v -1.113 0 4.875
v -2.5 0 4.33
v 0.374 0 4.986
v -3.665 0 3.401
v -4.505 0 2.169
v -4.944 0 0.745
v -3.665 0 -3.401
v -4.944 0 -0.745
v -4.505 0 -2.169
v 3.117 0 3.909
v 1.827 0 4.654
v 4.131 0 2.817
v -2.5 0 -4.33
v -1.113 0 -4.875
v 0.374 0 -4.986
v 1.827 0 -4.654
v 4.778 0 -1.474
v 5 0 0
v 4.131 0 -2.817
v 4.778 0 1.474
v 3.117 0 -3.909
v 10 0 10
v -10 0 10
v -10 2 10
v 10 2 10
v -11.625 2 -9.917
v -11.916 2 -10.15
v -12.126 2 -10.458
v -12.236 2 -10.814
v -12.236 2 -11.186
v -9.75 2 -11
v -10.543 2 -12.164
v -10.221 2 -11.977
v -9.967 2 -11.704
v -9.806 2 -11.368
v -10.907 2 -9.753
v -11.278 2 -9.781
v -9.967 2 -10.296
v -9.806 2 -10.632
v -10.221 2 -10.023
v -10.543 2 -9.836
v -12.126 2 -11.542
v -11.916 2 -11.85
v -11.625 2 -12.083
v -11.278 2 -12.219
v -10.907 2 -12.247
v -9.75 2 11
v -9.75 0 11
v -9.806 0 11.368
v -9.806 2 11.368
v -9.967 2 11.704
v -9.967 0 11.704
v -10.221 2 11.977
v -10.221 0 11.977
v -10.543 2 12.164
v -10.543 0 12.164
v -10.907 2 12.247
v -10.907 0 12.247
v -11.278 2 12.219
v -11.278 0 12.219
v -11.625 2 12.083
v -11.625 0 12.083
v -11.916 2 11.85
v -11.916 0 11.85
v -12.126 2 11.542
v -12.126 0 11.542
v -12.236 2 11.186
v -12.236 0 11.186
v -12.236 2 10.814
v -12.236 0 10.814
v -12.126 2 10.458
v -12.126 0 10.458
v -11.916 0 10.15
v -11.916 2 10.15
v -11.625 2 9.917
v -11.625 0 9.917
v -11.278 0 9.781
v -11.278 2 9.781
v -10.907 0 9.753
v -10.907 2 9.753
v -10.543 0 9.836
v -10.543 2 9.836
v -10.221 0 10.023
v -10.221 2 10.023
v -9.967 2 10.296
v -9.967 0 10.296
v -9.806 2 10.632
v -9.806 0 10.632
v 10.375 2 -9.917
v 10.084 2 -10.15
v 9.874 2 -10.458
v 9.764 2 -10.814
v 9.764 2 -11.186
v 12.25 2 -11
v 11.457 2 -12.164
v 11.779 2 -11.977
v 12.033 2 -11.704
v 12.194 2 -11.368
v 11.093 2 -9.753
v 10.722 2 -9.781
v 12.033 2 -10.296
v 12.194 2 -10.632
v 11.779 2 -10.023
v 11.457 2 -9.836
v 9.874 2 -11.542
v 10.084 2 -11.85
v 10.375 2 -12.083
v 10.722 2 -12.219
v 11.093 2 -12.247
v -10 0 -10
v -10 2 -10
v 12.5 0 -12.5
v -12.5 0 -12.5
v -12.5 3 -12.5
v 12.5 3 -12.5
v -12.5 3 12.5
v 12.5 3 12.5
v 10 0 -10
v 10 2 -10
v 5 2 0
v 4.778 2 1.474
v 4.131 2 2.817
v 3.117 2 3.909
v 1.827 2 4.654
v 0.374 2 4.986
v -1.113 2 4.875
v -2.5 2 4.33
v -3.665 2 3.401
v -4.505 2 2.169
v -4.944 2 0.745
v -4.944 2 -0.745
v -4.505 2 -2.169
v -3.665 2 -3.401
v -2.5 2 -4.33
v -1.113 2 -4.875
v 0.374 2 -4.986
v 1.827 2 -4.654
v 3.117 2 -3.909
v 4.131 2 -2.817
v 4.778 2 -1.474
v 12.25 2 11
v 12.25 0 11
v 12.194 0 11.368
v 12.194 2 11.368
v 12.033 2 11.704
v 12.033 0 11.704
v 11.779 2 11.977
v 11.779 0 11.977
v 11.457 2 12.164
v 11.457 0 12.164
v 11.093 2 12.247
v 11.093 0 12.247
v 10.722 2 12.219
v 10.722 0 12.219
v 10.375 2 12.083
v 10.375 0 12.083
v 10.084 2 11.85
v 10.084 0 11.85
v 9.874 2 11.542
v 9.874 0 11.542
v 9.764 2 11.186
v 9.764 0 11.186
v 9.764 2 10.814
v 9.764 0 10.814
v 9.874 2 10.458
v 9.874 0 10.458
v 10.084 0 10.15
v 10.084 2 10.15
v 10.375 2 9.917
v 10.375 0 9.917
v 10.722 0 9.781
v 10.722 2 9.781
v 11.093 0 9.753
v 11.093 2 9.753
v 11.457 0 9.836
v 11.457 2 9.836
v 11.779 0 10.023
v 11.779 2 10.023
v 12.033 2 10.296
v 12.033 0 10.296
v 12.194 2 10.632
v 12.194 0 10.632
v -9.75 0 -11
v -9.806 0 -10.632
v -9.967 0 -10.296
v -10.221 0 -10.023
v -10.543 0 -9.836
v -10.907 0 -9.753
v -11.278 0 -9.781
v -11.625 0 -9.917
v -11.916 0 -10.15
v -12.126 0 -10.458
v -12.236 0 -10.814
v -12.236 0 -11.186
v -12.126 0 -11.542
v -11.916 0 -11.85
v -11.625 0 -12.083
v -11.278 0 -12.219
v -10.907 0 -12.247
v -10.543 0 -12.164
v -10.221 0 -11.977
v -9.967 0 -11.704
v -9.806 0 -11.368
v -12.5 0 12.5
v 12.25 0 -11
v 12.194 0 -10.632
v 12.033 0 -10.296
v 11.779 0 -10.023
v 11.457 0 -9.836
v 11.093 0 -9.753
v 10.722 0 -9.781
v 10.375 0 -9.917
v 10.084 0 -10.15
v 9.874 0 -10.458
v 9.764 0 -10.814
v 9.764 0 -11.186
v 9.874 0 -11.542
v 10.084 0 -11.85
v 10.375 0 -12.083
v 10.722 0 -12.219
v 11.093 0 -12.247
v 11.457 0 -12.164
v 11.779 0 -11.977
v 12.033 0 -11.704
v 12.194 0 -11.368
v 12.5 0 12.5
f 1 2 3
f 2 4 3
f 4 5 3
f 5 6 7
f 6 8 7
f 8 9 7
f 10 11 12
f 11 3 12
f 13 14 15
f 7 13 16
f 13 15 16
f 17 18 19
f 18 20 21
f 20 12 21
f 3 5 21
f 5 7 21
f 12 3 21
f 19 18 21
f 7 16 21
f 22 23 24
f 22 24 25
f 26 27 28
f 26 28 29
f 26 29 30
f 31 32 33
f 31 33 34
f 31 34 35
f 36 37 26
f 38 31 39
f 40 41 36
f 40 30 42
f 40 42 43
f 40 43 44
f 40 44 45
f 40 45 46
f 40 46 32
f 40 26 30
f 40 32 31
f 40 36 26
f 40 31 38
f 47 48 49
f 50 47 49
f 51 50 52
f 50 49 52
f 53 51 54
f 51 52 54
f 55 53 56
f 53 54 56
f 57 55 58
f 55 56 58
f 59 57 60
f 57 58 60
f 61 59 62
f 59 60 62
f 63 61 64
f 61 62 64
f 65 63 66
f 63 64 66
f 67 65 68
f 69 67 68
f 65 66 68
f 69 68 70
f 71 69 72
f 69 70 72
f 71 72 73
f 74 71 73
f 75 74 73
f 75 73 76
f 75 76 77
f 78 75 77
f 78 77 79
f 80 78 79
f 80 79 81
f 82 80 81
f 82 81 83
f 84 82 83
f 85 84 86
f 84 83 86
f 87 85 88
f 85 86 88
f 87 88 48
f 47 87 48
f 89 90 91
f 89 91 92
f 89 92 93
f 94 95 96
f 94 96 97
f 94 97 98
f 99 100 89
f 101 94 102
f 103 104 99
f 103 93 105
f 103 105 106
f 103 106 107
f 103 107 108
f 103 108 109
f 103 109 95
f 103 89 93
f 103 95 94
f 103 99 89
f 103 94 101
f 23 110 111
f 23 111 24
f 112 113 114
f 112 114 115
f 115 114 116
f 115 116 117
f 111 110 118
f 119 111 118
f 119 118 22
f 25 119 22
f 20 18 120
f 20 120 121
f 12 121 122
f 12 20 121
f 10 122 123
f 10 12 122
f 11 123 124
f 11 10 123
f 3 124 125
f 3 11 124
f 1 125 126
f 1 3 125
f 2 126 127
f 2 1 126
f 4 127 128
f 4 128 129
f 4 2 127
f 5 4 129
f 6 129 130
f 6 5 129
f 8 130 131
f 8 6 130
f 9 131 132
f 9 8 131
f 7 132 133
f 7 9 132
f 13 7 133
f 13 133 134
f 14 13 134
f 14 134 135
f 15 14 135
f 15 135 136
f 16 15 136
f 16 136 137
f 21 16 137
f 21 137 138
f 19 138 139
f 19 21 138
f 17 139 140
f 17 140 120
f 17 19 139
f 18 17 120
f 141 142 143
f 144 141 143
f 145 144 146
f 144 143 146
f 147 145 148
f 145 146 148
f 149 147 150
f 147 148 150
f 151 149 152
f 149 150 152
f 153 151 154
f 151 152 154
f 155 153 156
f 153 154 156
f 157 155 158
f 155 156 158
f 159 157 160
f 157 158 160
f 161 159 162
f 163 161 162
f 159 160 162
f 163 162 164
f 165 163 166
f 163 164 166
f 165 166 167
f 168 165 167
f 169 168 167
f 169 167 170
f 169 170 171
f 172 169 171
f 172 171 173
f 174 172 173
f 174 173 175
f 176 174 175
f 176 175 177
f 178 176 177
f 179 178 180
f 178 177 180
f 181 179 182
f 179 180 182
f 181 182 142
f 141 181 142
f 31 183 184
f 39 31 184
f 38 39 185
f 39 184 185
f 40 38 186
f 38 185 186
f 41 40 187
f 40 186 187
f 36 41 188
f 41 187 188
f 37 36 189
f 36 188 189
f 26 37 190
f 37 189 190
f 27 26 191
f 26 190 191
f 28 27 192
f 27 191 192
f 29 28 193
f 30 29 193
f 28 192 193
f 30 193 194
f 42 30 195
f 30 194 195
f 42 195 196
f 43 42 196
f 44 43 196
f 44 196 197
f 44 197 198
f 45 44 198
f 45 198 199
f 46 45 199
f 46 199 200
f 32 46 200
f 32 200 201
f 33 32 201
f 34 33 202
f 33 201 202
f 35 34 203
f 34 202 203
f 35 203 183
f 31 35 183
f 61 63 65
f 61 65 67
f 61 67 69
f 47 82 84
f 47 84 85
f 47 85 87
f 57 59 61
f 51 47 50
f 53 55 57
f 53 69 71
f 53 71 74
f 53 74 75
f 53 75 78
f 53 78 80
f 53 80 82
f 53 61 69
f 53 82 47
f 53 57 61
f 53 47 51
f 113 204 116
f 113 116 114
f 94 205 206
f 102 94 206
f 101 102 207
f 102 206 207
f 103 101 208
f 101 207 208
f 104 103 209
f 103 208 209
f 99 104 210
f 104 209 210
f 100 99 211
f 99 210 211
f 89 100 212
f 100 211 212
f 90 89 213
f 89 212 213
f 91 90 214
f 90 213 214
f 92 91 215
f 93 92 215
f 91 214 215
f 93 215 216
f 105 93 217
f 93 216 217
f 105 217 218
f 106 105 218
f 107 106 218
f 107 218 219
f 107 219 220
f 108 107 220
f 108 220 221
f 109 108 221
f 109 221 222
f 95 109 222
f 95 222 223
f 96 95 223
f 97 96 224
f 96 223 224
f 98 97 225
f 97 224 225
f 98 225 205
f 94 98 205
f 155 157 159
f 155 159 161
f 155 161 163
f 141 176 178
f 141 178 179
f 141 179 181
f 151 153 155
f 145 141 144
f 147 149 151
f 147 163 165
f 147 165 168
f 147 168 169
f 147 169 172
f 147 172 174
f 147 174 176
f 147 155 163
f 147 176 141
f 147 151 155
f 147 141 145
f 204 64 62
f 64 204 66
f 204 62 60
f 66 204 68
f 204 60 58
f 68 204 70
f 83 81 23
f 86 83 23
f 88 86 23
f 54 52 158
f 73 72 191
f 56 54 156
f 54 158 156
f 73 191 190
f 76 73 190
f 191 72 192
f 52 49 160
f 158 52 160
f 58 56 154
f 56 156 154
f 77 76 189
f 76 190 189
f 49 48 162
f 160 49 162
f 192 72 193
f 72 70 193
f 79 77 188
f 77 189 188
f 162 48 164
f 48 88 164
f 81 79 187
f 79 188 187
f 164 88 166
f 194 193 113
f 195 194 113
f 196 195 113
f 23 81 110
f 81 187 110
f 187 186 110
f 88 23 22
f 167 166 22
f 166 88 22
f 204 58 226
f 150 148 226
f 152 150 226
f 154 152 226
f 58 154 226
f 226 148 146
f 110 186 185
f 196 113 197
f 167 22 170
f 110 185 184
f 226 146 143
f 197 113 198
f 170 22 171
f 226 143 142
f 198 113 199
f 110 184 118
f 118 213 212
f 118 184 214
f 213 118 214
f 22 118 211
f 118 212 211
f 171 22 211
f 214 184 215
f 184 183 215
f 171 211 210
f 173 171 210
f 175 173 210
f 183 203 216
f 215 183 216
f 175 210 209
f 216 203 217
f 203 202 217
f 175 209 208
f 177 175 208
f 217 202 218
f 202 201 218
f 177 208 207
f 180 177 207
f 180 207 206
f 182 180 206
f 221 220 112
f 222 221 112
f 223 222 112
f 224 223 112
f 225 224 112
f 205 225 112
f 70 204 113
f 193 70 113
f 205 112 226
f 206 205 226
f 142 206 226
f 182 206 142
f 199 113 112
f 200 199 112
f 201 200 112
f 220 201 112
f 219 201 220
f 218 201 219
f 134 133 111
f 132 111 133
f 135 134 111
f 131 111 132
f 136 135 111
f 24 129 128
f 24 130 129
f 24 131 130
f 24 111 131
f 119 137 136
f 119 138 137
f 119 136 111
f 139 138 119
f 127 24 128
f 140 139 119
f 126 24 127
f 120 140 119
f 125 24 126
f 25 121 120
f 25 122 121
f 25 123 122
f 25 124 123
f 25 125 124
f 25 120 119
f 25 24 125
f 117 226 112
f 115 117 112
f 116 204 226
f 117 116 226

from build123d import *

# Parameters (mm, degrees)
SKETCH1_W           = 25
SKETCH1_H           = 25
BOSS_EXTRUDE1_DEPTH = 3
SKETCH2_W           = 20
SKETCH2_H           = 20
SKETCH2_R           = 5
CUT_EXTRUDE1_DEPTH  = 2
SKETCH3_R           = 1.25
CUT_EXTRUDE2_DEPTH  = 2


with BuildPart() as part:
    # Sketch1 → Boss-Extrude1 (new body)
    with BuildSketch(Plane(origin=(0, 0, 0), x_dir=(1, 0, 0), z_dir=(0, 1, 0))):
        Rectangle(SKETCH1_W, SKETCH1_H)
    extrude(amount=BOSS_EXTRUDE1_DEPTH)

    # Sketch2 → Cut-Extrude1 (cut)
    with BuildSketch(Plane.XZ):
        Rectangle(SKETCH2_W, SKETCH2_H)
        Circle(SKETCH2_R, mode=Mode.SUBTRACT)
    extrude(amount=-CUT_EXTRUDE1_DEPTH, mode=Mode.SUBTRACT)

    # Sketch3 → Cut-Extrude2 (cut)
    with BuildSketch(Plane.XZ):
        with Locations((-11, 11)):
            Circle(SKETCH3_R)
        with Locations((11, 11)):
            Circle(SKETCH3_R)
        with Locations((11, -11)):
            Circle(SKETCH3_R)
        with Locations((-11, -11)):
            Circle(SKETCH3_R)
    extrude(amount=-CUT_EXTRUDE2_DEPTH, mode=Mode.SUBTRACT)


solid = part.part
